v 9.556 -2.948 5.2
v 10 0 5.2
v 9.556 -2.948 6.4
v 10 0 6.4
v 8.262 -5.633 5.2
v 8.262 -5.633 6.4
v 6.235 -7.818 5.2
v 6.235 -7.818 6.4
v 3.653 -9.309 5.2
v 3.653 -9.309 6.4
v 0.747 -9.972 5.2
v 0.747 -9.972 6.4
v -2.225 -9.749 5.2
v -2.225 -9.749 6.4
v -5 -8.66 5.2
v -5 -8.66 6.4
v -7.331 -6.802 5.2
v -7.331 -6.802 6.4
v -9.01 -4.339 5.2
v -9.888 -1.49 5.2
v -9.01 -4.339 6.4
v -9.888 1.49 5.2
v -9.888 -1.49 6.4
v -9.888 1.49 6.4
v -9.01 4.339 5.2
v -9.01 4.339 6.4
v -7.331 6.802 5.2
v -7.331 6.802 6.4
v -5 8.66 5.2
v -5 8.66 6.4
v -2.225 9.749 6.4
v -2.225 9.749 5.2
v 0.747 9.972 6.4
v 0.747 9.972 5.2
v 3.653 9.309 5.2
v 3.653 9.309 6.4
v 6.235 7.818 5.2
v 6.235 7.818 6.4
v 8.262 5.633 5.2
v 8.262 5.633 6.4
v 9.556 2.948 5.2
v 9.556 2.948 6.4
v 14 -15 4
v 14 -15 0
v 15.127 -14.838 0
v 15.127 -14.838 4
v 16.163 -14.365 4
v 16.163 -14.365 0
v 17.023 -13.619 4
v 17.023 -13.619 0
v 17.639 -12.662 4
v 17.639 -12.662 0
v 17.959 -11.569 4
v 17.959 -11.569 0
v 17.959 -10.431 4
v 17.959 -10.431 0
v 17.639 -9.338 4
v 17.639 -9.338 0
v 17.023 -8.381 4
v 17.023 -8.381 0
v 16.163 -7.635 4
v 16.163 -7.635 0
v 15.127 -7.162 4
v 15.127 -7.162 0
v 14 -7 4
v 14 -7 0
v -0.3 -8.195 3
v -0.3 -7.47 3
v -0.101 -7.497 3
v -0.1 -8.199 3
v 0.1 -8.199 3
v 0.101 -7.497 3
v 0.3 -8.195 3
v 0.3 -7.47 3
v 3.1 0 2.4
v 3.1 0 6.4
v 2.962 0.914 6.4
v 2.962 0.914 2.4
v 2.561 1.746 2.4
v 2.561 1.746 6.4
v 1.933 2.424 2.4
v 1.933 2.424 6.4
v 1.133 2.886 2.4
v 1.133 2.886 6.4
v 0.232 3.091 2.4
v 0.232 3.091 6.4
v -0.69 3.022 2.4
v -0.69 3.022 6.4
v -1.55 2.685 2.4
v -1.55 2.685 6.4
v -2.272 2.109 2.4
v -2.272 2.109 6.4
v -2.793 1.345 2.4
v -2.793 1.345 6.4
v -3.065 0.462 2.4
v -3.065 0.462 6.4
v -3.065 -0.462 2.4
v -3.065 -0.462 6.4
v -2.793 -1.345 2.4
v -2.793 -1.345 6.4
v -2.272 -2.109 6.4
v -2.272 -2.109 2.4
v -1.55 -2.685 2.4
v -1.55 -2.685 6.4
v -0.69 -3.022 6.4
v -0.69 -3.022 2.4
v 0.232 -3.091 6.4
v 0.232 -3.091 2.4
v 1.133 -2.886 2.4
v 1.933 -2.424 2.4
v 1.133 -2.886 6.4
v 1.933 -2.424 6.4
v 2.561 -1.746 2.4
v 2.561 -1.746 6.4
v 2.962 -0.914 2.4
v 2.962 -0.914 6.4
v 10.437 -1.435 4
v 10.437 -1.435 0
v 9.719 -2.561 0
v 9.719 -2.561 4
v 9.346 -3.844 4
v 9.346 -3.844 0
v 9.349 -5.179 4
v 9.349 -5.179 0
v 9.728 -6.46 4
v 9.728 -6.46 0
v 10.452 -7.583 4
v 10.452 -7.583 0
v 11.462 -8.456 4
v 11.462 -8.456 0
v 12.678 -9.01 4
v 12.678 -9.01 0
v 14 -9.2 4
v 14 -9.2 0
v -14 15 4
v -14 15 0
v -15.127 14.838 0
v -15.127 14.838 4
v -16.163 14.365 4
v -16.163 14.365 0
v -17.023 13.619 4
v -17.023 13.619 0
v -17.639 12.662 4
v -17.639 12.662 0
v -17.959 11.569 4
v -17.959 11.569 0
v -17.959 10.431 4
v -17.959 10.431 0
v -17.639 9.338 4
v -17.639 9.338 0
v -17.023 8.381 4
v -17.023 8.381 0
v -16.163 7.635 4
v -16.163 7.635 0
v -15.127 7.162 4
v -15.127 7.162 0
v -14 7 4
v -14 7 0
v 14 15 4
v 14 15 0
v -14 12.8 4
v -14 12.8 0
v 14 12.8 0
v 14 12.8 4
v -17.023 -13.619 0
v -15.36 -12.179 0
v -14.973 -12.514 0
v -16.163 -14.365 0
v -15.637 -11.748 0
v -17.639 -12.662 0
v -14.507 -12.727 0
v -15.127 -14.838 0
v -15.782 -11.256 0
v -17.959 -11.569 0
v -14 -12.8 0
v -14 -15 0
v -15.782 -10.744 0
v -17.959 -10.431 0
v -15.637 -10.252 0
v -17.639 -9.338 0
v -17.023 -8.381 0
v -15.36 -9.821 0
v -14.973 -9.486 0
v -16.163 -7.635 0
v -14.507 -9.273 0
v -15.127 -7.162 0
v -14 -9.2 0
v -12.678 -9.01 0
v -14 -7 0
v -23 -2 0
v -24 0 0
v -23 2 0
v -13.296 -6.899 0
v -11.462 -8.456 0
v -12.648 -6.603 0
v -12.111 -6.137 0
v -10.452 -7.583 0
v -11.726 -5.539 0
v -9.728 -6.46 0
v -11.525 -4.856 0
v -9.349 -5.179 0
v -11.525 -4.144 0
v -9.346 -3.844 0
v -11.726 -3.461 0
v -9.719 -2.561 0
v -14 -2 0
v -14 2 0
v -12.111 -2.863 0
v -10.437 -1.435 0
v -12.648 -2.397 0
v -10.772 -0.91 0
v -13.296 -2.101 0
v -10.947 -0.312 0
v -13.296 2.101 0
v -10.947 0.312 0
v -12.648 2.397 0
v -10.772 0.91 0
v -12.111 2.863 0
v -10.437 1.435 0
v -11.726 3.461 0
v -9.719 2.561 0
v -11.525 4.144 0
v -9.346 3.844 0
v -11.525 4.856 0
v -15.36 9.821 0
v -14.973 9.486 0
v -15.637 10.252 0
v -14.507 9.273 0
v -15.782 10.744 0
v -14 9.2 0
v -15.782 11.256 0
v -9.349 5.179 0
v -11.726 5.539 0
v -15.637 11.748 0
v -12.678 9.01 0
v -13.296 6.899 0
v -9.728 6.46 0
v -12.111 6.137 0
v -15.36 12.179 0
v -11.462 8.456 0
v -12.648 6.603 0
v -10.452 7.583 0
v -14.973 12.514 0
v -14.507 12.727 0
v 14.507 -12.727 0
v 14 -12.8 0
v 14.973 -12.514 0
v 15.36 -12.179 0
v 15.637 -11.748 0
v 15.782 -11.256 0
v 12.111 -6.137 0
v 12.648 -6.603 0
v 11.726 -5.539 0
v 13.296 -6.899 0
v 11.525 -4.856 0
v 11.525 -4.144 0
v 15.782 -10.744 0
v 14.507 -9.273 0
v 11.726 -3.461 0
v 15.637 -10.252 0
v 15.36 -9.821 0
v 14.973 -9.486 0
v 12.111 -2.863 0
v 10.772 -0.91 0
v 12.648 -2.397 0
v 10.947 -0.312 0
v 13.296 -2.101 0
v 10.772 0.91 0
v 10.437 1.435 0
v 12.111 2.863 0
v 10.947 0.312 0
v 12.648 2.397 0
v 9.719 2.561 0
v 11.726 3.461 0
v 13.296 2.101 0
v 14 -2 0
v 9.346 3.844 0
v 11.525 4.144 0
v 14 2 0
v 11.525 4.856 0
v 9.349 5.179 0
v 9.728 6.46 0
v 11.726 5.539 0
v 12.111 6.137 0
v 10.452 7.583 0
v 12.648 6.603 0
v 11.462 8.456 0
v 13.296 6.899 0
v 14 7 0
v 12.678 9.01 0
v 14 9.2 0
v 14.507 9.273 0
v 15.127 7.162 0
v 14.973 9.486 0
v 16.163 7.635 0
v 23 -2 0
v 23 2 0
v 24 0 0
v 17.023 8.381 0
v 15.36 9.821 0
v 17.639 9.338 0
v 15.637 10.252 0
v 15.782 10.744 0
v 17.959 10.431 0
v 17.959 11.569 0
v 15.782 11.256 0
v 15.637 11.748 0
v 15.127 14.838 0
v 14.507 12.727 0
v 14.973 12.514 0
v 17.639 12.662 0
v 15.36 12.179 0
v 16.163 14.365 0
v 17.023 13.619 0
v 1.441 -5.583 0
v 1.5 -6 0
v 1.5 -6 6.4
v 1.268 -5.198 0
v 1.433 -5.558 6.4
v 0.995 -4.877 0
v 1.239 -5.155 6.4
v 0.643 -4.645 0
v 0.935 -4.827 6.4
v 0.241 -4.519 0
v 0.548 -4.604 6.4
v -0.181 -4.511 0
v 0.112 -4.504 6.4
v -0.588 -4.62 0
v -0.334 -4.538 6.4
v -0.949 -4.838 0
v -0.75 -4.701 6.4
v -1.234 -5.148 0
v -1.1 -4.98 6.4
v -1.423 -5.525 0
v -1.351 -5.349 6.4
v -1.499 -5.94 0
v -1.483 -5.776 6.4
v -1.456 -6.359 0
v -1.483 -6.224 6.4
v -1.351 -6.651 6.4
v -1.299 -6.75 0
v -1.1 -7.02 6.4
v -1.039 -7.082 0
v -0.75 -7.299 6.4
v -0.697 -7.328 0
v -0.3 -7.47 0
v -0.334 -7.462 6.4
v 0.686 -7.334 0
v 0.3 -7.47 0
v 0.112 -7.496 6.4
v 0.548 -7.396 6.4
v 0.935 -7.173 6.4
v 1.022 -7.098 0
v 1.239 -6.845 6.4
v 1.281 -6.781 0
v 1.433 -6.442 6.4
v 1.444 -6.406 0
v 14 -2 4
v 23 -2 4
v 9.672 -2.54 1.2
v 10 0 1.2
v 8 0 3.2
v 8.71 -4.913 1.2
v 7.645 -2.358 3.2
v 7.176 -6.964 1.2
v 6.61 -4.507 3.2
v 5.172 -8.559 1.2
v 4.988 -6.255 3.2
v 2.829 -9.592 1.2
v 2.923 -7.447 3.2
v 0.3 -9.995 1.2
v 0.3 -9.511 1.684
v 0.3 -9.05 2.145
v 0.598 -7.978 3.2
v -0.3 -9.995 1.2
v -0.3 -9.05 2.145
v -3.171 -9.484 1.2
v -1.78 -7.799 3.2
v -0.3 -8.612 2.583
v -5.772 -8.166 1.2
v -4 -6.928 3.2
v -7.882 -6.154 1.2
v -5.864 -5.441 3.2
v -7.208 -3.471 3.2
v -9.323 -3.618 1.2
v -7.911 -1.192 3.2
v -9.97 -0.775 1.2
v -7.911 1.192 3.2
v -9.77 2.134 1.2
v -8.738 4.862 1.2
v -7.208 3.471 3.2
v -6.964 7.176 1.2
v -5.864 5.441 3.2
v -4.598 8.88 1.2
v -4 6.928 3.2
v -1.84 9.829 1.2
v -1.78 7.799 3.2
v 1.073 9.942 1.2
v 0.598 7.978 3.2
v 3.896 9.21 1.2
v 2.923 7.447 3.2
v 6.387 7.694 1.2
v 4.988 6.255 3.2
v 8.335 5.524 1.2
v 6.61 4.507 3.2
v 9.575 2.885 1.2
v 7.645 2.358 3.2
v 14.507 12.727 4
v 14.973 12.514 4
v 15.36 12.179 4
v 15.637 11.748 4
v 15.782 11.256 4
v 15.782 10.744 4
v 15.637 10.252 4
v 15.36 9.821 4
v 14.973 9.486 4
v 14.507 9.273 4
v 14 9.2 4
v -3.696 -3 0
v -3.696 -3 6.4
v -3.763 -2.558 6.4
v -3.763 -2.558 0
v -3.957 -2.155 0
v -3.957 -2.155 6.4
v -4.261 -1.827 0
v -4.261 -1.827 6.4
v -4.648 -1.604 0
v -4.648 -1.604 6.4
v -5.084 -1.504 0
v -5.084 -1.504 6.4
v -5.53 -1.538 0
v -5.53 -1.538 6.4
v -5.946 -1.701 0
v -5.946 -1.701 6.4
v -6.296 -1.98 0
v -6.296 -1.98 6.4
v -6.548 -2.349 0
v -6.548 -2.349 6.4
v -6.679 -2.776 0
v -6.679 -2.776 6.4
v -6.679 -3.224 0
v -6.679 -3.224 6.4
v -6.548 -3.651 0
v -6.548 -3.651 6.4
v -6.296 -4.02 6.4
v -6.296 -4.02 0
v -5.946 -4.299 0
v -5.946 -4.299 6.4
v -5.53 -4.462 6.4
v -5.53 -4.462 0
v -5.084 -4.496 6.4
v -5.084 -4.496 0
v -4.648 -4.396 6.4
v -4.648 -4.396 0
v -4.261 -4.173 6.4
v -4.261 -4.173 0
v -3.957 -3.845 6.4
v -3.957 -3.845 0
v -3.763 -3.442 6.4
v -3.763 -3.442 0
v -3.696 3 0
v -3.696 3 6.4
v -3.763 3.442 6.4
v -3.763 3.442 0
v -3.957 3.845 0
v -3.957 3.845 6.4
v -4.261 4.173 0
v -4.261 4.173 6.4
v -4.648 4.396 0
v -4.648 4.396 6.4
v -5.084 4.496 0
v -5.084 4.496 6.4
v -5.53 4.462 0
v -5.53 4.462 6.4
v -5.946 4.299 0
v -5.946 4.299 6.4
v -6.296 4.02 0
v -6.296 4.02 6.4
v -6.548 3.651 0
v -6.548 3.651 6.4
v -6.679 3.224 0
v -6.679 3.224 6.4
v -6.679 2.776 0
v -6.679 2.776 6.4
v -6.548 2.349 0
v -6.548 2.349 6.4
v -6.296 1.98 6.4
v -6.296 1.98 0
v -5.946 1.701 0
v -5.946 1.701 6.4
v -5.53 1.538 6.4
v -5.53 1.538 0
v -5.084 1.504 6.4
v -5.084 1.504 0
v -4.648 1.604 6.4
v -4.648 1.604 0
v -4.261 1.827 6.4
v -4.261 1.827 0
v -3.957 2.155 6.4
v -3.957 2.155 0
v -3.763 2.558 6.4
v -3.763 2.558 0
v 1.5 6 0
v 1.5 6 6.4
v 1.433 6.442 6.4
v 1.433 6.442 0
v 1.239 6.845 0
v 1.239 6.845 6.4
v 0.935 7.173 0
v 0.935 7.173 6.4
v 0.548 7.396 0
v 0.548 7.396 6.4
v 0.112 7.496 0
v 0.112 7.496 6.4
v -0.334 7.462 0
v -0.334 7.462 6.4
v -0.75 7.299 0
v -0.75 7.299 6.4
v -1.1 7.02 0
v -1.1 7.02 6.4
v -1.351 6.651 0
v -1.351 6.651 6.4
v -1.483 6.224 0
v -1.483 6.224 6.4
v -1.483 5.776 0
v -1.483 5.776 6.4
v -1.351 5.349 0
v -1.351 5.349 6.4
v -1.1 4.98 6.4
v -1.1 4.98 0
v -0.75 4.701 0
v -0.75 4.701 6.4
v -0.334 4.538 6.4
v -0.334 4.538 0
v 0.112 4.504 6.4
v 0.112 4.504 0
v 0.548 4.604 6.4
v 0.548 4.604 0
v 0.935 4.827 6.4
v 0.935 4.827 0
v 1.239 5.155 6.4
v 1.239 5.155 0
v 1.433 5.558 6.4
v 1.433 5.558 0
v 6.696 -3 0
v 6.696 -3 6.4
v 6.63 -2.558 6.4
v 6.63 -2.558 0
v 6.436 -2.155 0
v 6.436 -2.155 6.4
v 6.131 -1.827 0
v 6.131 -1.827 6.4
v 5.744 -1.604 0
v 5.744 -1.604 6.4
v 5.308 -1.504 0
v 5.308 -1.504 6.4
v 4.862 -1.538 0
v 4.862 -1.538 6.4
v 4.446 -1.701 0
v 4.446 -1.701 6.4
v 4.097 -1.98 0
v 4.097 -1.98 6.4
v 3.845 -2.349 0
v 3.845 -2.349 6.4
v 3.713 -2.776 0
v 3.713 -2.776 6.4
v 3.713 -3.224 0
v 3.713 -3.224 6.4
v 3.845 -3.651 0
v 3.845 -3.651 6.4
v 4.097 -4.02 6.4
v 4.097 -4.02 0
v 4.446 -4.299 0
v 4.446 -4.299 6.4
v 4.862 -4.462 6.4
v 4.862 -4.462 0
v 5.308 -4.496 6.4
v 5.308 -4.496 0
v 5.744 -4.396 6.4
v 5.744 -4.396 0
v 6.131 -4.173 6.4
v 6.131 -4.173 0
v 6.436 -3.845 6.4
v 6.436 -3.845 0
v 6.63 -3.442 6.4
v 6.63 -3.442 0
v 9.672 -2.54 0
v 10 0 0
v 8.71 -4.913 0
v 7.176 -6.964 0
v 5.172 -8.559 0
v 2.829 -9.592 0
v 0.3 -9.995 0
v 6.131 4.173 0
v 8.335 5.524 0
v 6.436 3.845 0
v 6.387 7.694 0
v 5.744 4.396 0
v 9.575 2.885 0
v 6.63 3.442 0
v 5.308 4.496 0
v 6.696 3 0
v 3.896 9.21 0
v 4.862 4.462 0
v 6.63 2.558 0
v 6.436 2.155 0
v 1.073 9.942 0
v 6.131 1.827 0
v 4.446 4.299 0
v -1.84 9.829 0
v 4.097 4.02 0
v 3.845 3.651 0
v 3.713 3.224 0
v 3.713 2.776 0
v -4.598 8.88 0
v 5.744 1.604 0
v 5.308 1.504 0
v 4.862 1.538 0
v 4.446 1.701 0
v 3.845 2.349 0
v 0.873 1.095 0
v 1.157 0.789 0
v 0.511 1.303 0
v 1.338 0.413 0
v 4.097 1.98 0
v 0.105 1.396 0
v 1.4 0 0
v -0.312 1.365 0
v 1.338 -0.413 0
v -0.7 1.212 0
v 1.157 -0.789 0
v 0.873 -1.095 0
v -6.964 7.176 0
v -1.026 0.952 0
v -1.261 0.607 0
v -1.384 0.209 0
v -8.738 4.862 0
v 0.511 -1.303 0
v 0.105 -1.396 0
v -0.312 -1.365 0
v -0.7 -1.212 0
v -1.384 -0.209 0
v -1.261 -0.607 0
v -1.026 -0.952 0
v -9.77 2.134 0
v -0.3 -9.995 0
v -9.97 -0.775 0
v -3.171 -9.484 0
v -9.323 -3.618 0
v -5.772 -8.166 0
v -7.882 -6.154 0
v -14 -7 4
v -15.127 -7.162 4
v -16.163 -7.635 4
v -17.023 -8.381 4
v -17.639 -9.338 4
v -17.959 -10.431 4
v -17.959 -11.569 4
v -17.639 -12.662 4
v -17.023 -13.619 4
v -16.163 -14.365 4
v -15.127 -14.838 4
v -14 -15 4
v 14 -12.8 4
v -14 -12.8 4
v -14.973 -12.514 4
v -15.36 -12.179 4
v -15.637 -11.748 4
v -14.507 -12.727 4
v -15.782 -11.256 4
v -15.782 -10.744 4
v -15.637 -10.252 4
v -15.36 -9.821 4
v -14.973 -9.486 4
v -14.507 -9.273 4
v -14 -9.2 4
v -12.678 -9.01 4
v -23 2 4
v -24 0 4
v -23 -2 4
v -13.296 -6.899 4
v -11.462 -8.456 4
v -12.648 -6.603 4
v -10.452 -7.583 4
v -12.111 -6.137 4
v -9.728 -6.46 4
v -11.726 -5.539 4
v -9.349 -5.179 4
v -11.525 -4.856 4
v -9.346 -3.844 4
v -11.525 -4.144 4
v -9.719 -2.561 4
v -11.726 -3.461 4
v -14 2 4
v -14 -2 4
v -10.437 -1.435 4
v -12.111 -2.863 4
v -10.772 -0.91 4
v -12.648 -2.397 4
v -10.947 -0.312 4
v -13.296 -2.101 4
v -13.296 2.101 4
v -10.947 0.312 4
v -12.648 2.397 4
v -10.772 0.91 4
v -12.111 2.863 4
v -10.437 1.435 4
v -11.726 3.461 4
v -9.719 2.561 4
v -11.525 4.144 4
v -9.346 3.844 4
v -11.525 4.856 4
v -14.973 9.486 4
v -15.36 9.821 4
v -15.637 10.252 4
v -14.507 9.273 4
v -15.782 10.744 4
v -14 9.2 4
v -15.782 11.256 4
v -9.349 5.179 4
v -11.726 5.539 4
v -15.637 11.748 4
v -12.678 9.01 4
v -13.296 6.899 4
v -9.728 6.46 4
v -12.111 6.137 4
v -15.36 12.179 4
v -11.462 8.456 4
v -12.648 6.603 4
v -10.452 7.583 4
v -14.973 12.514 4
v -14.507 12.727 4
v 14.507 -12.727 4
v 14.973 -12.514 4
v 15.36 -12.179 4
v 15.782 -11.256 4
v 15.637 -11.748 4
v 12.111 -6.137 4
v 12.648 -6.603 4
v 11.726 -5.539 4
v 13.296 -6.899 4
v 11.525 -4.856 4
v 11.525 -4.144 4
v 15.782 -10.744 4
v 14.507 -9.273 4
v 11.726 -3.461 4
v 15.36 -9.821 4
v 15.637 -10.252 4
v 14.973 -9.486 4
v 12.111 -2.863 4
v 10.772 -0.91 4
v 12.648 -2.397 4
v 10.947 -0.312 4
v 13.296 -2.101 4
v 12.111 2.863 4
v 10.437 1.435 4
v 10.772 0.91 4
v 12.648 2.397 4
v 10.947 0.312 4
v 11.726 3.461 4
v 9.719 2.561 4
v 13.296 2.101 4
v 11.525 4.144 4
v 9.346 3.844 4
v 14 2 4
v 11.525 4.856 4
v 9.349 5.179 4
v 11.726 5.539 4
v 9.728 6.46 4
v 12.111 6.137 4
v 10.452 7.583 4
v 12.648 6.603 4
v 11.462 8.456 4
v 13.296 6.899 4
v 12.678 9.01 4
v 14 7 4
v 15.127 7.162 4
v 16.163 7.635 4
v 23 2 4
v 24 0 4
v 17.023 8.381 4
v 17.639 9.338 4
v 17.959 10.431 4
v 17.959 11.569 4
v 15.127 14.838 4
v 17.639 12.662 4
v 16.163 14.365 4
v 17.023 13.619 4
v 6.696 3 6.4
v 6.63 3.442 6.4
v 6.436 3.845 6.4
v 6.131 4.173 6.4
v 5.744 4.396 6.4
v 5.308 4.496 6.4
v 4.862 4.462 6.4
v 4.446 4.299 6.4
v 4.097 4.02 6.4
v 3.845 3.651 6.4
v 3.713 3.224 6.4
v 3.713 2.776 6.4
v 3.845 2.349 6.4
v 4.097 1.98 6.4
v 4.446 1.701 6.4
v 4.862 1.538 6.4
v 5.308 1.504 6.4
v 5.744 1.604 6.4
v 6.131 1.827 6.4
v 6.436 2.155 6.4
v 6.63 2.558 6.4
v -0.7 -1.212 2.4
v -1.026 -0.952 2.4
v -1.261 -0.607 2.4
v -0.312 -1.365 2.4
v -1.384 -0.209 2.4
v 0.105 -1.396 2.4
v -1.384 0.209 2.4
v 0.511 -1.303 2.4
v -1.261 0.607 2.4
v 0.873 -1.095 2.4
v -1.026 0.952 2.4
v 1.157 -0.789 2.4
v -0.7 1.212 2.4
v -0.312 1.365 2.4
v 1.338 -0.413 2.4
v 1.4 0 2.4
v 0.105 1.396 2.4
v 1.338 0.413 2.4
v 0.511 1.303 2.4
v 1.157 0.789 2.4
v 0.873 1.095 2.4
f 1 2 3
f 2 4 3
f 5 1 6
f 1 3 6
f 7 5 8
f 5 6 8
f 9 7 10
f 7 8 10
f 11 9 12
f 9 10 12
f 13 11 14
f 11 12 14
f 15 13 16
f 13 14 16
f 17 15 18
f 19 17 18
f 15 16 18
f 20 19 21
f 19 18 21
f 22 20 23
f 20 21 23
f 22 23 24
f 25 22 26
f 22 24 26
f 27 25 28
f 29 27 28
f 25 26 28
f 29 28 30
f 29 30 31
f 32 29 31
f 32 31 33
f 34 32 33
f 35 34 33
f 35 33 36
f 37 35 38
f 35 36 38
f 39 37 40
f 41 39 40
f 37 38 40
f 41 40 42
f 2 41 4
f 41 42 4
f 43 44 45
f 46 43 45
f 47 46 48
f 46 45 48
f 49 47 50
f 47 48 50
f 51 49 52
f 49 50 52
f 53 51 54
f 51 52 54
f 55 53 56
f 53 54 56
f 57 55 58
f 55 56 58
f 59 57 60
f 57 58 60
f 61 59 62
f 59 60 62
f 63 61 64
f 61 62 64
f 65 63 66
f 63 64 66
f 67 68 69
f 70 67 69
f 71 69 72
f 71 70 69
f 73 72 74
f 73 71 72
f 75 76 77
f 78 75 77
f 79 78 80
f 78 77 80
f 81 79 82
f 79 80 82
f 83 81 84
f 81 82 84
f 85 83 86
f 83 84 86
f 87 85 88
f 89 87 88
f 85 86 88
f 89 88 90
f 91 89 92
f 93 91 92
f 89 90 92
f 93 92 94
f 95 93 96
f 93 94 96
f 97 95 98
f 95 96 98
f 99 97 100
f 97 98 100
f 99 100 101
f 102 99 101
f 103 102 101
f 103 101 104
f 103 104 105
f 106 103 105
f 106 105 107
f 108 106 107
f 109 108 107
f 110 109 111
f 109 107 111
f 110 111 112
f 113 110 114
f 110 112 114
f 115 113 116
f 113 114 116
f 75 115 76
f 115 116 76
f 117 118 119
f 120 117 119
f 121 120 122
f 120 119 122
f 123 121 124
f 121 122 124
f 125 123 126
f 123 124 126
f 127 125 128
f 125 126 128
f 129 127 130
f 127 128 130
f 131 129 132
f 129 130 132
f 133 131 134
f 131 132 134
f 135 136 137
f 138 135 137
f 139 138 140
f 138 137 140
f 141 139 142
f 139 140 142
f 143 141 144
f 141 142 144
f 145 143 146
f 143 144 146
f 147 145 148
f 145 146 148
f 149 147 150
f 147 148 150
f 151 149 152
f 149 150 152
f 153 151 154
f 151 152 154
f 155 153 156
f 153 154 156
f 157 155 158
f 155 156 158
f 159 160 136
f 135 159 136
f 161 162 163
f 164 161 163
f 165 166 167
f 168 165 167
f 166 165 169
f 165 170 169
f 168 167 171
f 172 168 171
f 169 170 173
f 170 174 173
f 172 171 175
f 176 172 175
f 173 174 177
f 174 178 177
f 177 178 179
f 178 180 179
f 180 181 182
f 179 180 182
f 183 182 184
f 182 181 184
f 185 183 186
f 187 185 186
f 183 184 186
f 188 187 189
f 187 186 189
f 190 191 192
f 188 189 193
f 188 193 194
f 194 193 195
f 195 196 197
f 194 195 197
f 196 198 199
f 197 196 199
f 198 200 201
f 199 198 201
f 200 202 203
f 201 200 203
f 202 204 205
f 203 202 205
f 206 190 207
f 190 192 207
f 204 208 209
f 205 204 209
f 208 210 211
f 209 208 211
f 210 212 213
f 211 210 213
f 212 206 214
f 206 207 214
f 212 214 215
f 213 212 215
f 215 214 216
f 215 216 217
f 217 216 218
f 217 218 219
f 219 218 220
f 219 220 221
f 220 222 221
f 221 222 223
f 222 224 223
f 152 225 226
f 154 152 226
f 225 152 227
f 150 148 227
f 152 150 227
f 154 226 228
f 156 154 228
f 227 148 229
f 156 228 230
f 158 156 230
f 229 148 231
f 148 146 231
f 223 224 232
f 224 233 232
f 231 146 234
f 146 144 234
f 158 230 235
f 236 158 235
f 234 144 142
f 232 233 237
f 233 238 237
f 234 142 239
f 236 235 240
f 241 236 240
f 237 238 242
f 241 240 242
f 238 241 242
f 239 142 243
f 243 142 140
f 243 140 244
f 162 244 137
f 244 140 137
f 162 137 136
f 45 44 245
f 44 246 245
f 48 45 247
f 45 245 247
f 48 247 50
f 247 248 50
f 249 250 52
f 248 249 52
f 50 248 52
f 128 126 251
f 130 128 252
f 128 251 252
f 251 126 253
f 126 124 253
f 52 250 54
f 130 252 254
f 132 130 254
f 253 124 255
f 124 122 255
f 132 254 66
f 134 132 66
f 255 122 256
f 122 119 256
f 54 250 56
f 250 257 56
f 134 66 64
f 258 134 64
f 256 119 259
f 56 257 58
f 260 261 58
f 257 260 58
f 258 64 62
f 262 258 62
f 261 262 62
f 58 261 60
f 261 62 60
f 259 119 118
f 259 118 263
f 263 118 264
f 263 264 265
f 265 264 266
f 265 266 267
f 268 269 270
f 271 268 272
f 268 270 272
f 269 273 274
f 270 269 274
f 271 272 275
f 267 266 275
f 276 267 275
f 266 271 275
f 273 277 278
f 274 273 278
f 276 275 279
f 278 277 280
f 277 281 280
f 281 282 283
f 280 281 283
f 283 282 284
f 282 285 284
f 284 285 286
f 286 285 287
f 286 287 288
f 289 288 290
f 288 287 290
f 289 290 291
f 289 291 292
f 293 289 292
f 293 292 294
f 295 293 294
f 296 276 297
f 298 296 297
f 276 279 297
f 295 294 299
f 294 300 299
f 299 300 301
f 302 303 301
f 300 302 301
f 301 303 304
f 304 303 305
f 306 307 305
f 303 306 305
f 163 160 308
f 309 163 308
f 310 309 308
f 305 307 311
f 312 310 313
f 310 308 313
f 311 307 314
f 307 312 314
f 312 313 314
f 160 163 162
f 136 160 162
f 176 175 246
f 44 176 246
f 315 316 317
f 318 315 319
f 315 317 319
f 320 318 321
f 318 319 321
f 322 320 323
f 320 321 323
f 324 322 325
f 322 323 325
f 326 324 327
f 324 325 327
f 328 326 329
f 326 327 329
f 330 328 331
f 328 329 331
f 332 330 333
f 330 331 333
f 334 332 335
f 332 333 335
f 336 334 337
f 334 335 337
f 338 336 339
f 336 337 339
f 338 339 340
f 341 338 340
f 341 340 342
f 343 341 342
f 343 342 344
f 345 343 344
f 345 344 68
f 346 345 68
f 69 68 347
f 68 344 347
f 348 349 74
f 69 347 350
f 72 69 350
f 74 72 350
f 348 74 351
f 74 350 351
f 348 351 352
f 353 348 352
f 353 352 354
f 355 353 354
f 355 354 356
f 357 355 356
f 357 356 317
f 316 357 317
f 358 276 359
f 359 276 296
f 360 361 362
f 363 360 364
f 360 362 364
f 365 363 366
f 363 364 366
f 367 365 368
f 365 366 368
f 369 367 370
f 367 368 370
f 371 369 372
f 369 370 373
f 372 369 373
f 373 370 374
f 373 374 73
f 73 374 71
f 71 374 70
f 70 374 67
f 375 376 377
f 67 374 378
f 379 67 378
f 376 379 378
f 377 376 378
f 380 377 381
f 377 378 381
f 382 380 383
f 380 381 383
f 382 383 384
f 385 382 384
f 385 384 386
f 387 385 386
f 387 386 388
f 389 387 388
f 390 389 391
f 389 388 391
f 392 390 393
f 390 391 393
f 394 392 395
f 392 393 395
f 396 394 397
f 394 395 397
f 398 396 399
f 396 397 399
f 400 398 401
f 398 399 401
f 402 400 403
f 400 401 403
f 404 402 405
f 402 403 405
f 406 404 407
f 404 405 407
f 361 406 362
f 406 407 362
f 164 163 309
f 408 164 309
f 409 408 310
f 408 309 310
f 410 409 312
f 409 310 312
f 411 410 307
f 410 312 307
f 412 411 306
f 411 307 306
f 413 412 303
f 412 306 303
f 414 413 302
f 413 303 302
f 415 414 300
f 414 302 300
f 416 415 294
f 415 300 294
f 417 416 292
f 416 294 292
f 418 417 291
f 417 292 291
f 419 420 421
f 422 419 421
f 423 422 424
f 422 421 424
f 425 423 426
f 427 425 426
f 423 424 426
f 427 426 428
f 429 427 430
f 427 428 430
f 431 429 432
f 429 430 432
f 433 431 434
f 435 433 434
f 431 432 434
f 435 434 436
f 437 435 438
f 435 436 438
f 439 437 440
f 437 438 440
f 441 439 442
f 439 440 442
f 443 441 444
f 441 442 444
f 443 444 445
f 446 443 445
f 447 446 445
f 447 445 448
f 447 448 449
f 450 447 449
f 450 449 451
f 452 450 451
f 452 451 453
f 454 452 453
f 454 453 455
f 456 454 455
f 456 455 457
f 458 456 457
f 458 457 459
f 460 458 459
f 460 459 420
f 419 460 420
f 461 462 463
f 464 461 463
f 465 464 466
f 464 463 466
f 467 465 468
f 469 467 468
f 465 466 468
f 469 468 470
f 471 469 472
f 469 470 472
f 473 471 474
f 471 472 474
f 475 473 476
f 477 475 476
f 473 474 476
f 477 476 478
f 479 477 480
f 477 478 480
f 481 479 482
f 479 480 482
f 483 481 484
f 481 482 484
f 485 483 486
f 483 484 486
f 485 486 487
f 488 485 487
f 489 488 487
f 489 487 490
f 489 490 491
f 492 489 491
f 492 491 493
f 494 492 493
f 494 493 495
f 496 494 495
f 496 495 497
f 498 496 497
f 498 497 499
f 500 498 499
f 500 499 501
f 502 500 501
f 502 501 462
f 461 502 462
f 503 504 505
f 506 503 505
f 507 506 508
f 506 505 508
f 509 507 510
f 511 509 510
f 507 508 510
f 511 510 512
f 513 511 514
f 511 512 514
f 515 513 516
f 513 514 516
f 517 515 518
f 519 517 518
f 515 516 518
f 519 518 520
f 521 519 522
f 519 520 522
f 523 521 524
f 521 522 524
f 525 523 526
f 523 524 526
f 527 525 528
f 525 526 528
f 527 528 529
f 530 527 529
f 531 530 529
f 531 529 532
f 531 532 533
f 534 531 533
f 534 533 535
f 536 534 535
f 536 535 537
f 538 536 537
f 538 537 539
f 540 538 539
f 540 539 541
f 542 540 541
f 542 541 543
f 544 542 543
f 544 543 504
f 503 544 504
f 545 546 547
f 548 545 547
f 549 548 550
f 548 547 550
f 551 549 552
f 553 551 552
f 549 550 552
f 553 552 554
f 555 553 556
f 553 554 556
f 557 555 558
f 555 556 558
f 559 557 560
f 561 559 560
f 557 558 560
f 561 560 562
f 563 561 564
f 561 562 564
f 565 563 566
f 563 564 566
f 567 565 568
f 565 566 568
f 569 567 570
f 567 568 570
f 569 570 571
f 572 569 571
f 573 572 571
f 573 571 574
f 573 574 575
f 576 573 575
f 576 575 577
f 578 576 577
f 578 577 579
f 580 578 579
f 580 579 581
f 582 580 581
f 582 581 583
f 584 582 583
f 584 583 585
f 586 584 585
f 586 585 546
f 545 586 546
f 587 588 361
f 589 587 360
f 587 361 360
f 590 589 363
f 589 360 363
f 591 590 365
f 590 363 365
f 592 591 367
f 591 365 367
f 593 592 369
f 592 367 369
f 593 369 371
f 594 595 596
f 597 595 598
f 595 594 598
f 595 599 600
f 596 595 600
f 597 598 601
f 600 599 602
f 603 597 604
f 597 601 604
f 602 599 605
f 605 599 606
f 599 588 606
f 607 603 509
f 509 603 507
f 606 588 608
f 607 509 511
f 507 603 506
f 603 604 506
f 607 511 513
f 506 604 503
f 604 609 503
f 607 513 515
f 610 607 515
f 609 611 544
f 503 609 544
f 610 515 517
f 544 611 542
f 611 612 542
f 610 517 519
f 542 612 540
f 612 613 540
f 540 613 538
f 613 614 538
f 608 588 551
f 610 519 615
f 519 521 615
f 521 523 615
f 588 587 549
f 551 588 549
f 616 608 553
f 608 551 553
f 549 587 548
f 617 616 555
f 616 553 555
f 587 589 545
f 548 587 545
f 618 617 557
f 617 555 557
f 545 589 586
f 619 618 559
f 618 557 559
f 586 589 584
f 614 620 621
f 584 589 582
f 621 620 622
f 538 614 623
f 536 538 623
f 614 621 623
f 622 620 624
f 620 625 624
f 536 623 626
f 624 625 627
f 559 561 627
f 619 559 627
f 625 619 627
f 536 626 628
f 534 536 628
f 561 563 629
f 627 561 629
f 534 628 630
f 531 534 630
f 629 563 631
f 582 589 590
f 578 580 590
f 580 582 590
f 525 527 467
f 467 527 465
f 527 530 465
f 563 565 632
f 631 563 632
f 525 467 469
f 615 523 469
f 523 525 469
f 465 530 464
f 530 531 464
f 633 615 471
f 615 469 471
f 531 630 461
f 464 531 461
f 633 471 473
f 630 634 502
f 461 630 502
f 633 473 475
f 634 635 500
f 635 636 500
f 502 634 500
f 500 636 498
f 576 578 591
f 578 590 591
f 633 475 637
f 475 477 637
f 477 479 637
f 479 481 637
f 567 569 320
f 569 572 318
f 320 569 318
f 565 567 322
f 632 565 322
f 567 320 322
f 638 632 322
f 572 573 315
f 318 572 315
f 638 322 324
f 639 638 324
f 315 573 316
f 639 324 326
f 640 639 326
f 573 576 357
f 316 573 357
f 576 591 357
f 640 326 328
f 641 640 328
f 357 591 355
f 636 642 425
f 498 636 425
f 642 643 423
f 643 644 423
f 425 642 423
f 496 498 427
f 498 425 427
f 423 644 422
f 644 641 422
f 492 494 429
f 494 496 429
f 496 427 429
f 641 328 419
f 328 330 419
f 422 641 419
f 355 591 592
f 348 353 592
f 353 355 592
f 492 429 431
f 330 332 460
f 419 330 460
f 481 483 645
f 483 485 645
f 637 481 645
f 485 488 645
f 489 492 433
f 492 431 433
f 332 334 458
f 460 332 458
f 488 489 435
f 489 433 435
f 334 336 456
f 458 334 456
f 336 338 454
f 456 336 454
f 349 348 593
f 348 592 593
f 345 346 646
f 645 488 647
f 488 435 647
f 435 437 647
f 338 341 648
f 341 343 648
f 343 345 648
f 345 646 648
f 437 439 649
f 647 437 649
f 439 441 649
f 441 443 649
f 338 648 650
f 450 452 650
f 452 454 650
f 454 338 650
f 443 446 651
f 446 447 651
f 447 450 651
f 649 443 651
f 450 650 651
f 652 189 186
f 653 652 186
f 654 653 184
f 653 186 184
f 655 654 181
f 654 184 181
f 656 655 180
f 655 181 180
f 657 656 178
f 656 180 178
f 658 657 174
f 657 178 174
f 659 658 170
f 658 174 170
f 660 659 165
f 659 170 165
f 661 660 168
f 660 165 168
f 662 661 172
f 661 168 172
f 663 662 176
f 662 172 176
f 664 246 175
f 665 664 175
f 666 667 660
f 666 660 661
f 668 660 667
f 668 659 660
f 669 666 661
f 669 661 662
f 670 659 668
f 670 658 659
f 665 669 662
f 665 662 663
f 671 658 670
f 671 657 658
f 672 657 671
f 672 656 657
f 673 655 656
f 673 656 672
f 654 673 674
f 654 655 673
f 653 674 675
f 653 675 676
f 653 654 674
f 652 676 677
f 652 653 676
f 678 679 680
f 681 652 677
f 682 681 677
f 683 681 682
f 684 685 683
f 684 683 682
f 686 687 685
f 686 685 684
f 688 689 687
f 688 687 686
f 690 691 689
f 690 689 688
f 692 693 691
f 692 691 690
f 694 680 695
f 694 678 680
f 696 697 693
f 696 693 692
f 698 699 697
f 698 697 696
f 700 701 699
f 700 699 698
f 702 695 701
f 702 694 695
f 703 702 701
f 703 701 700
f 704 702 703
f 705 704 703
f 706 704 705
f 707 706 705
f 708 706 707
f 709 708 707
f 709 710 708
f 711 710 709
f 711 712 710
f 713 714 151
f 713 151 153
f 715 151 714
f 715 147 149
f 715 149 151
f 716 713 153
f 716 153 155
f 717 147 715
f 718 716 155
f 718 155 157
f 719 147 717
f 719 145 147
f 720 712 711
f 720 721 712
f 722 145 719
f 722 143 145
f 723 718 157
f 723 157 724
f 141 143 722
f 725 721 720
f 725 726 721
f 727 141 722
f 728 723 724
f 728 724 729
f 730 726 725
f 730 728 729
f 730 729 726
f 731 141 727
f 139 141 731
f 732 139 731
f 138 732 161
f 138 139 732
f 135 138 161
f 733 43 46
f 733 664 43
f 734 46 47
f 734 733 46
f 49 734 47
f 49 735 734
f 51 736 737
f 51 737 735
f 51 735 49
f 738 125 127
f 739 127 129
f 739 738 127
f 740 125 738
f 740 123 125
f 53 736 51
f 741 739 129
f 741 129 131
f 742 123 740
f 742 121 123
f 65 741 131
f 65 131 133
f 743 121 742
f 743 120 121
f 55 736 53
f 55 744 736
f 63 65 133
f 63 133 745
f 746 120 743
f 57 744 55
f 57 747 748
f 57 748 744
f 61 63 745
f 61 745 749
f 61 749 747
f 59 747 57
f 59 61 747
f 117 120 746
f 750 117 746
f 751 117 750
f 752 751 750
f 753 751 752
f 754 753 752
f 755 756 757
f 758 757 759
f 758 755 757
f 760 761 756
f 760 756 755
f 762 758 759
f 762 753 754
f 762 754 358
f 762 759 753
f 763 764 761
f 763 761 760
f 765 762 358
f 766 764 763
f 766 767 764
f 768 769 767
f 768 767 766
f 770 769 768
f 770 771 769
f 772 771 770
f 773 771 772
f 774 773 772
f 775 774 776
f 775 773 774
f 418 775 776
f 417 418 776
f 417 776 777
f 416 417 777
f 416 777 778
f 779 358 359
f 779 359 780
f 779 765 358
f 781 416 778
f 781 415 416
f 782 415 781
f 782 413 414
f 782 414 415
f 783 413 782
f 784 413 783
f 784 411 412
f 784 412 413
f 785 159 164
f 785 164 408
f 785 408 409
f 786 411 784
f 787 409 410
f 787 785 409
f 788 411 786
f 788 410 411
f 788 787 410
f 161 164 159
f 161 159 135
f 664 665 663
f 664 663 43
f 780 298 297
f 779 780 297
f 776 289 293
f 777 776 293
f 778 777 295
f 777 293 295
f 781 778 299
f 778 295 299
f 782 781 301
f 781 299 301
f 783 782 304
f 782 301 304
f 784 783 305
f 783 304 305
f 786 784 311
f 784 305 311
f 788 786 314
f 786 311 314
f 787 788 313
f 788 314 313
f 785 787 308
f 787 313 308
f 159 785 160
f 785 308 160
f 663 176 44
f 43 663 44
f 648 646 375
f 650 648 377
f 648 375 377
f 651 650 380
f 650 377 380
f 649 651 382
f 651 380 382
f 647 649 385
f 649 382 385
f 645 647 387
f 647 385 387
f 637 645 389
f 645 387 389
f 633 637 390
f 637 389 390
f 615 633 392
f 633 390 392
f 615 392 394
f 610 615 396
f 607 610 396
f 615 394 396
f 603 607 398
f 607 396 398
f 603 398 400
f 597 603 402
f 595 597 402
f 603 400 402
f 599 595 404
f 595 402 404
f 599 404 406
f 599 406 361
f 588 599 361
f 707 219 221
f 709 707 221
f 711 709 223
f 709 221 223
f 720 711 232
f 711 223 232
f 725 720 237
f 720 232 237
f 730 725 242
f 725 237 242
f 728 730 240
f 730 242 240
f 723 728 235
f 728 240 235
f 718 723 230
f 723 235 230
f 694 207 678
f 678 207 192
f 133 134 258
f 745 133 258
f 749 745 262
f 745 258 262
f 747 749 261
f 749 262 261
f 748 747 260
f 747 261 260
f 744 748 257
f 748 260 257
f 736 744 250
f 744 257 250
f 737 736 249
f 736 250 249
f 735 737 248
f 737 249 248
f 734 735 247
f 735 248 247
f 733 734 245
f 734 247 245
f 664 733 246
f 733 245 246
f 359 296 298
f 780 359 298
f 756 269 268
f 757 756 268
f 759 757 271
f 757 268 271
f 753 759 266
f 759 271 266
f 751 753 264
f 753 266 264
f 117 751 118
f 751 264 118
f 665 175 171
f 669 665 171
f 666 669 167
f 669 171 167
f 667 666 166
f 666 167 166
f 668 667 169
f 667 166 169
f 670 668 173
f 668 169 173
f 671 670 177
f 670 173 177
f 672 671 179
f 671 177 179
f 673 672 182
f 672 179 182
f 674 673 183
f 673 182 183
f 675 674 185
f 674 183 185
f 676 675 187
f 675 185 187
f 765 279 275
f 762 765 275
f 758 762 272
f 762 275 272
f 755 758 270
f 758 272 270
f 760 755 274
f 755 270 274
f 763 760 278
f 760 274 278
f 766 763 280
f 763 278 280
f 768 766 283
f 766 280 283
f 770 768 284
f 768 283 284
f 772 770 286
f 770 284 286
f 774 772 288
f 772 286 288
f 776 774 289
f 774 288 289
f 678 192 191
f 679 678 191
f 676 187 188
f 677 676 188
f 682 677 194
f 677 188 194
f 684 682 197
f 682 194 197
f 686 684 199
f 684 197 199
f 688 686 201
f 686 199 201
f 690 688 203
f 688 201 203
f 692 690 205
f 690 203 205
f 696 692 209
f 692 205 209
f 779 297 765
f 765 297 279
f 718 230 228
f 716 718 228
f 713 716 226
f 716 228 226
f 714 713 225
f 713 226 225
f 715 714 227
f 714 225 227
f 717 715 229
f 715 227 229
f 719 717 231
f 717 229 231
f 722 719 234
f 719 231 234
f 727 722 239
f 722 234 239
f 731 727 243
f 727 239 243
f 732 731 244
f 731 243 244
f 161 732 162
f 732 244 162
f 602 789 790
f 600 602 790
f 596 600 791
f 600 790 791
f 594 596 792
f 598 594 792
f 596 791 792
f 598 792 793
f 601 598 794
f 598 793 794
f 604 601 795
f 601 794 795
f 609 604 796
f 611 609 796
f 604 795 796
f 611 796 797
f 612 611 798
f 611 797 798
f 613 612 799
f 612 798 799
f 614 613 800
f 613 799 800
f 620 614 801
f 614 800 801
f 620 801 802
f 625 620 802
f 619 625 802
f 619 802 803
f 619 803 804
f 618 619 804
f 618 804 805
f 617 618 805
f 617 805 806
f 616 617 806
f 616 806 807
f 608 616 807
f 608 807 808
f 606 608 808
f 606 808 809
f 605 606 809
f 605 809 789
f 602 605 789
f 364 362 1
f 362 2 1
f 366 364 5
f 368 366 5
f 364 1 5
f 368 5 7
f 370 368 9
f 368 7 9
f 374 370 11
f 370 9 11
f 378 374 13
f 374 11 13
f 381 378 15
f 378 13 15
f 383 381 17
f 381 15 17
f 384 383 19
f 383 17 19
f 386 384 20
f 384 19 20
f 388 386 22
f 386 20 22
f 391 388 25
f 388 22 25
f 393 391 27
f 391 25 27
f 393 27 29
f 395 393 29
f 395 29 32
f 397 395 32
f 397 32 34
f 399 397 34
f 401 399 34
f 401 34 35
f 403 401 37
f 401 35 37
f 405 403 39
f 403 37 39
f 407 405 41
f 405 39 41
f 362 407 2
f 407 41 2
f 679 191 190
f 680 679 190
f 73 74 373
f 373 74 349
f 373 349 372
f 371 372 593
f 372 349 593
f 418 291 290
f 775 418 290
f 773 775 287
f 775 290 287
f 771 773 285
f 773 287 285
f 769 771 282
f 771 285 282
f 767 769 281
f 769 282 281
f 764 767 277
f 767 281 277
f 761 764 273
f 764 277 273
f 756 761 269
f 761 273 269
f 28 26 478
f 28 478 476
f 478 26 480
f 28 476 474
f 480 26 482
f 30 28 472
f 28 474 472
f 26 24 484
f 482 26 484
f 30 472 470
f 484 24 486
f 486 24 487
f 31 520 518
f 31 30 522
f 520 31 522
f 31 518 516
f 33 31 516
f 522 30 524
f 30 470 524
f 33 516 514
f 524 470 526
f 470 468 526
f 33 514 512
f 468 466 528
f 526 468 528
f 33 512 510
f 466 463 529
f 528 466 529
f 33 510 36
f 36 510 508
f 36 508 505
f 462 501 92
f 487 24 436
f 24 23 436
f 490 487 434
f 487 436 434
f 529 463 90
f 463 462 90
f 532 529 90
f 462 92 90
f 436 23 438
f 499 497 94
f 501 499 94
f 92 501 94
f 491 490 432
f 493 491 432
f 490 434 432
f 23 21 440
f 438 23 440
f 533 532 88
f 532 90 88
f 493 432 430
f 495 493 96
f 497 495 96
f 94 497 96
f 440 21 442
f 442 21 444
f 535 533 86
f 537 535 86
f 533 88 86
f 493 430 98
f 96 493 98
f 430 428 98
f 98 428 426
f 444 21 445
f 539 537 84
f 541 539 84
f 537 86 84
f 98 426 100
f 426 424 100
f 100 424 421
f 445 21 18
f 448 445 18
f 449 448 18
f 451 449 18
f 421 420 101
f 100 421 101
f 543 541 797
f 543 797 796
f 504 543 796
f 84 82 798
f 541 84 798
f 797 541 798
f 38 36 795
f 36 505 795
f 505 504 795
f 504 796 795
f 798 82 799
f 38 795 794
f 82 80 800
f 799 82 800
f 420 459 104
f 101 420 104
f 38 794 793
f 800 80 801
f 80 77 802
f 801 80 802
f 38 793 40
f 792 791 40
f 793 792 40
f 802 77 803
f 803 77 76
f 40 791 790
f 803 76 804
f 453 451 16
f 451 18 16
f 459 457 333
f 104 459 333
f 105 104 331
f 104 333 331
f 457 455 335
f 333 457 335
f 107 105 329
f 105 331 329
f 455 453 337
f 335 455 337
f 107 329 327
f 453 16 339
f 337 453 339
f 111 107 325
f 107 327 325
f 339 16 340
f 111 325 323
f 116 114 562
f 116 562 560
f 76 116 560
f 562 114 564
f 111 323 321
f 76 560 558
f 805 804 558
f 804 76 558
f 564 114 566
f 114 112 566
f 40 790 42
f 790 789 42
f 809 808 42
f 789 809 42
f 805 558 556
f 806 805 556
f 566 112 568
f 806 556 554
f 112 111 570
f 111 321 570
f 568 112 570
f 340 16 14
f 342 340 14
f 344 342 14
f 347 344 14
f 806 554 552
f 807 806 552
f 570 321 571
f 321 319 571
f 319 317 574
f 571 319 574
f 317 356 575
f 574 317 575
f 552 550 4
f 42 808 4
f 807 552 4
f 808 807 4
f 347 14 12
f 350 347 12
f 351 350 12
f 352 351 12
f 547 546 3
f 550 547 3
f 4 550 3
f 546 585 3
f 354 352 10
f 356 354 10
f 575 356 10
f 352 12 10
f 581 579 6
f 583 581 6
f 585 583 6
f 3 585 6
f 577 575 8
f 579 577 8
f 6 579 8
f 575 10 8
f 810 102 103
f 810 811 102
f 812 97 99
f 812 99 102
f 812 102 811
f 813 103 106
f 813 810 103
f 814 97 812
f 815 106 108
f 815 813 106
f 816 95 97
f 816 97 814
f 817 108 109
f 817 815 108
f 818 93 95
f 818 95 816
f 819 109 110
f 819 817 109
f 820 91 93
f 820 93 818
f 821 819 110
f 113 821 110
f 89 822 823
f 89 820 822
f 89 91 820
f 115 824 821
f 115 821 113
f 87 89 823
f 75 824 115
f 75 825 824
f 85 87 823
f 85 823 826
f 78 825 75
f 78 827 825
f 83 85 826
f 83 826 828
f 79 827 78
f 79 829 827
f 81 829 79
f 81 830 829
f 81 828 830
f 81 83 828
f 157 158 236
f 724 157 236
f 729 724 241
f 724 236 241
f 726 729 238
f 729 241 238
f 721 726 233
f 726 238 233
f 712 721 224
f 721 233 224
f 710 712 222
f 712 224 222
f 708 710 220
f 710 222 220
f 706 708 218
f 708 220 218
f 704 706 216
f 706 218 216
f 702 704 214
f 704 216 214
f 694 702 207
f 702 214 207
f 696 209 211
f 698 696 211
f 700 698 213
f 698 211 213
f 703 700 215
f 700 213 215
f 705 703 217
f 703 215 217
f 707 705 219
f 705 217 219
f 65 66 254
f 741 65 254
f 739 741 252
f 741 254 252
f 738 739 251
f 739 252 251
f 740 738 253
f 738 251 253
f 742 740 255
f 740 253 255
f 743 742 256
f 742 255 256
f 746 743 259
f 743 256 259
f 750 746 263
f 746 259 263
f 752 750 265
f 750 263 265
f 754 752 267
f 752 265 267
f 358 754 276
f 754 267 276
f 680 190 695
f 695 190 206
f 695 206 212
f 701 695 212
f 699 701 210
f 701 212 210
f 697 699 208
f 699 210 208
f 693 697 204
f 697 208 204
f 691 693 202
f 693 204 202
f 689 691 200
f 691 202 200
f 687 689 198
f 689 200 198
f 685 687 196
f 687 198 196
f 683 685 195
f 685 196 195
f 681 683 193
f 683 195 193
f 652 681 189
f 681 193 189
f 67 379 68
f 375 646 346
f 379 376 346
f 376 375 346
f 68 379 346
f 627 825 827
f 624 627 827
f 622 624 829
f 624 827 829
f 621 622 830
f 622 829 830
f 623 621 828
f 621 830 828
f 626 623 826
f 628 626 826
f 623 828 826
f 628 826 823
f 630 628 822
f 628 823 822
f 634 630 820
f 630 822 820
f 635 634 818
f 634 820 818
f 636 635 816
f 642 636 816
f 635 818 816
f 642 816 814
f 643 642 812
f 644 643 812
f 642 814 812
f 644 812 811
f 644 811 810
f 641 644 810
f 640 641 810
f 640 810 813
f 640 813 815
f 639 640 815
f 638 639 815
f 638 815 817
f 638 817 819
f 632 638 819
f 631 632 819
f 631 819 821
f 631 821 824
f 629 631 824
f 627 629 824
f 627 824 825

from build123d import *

# Parameters (mm, degrees)
F1_DEPTH = 4
F4_R     = 1.5
F4_R_2   = 1.4
F5_DEPTH = 6.401
F4_R_3   = 3.1
F6_DEPTH = 4
F8_DEPTH = 3


# Not quite as in the source:
# - a feature names something its author has since deleted; it is built from what else it names


with BuildPart() as f1:
    # F0 (on Top) → F1 (new body)
    with BuildSketch(Plane.XY):
        with BuildLine():
            Line((-23, 2), (-24, 0))
            Line((-24, 0), (-23, -2))
            Line((-23, -2), (-14, -2))
            ThreePointArc((-14, -2), (-11.5, -4.5), (-14, -7))
            ThreePointArc((-14, -7), (-18, -11), (-14, -15))
            Line((-14, -15), (0, -15))
            Line((0, -15), (14, -15))
            ThreePointArc((14, -15), (18, -11), (14, -7))
            ThreePointArc((14, -7), (11.5, -4.5), (14, -2))
            Line((14, -2), (23, -2))
            Line((23, -2), (24, 0))
            Line((24, 0), (23, 2))
            Line((23, 2), (14, 2))
            ThreePointArc((14, 2), (11.5, 4.5), (14, 7))
            ThreePointArc((14, 7), (18, 11), (14, 15))
            Line((14, 15), (0, 15))
            Line((0, 15), (-14, 15))
            ThreePointArc((-14, 15), (-18, 11), (-14, 7))
            ThreePointArc((-14, 7), (-11.5, 4.5), (-14, 2))
            Line((-14, 2), (-23, 2))
        make_face()
        with BuildLine():
            ThreePointArc((-14, -9.2000002265), (-9.7282015038, -6.4600356469), (-10.4370736488, -1.4347825616))
            ThreePointArc((-10.4370736488, -1.4347825616), (-10.969320969, 0), (-10.4370736488, 1.4347825616))
            ThreePointArc((-10.4370736488, 1.4347825616), (-9.7282015038, 6.4600356469), (-14, 9.2000002265))
            ThreePointArc((-14, 9.2000002265), (-15.7999997735, 11), (-14, 12.7999997735))
            Line((-14, 12.7999997735), (0.5136036673, 12.7999997735))
            Line((0.5136036673, 12.7999997735), (14, 12.7999997735))
            ThreePointArc((14, 12.7999997735), (15.7999997735, 11), (14, 9.2000002265))
            ThreePointArc((14, 9.2000002265), (9.7282015038, 6.4600356469), (10.4370736488, 1.4347825616))
            ThreePointArc((10.4370736488, 1.4347825616), (10.969320969, 0), (10.4370736488, -1.4347825616))
            ThreePointArc((10.4370736488, -1.4347825616), (9.7282015038, -6.4600356469), (14, -9.2000002265))
            ThreePointArc((14, -9.2000002265), (15.7999997735, -11), (14, -12.7999997735))
            Line((14, -12.7999997735), (0, -12.7999997735))
            Line((0, -12.7999997735), (-14, -12.7999997735))
            ThreePointArc((-14, -12.7999997735), (-15.7999997735, -11), (-14, -9.2000002265))
        make_face(mode=Mode.SUBTRACT)
    extrude(amount=F1_DEPTH)


with BuildPart() as f3:
    # F2 (on Front) → F3 (revolve)
    with BuildSketch(Plane.XZ):
        Polygon((0, 6.4), (0, 0), (10, 0), (10, 1.2), (8, 3.2), (10, 5.2), (10, 6.4), align=None)
    revolve(axis=Axis((0, 0, 3.2), (0, 0, -1)))

    # F4 (on face) → F5 (cut, through all)
    with BuildSketch(Plane.XY.offset(6.4)):
        with Locations((5.1961524227, 3)):
            Circle(F4_R)
        with Locations((5.1961524227, -3)):
            Circle(F4_R)
        with Locations((0, -6)):
            Circle(F4_R)
        with Locations((-5.1961524227, -3)):
            Circle(F4_R)
        with Locations((-5.1961524227, 3)):
            Circle(F4_R)
        Circle(F4_R_2)
        with Locations((0, 6)):
            Circle(F4_R)
    extrude(amount=-F5_DEPTH, mode=Mode.SUBTRACT)

    # F4 (on face) → F6 (cut)
    with BuildSketch(Plane.XY.offset(6.4)):
        Circle(F4_R_3)
        Circle(F4_R_2, mode=Mode.SUBTRACT)
    extrude(amount=-F6_DEPTH, mode=Mode.SUBTRACT)

    # F7 (on face) → F8 (cut)
    with BuildSketch(Plane(origin=(0, 0, 0), x_dir=(1, 0, 0), z_dir=(0, 0, -1))):
        with BuildLine():
            ThreePointArc((-0.3, 7.4696938457), (0, 7.5), (0.3, 7.4696938457))
            Line((0.3, 7.4696938457), (0.3, 9.995498987))
            ThreePointArc((0.3, 9.995498987), (0, 10), (-0.3, 9.995498987))
            Line((-0.3, 9.995498987), (-0.3, 7.4696938457))
        make_face()
    extrude(amount=-F8_DEPTH, mode=Mode.SUBTRACT)


solid = Compound([f1.part, f3.part])
